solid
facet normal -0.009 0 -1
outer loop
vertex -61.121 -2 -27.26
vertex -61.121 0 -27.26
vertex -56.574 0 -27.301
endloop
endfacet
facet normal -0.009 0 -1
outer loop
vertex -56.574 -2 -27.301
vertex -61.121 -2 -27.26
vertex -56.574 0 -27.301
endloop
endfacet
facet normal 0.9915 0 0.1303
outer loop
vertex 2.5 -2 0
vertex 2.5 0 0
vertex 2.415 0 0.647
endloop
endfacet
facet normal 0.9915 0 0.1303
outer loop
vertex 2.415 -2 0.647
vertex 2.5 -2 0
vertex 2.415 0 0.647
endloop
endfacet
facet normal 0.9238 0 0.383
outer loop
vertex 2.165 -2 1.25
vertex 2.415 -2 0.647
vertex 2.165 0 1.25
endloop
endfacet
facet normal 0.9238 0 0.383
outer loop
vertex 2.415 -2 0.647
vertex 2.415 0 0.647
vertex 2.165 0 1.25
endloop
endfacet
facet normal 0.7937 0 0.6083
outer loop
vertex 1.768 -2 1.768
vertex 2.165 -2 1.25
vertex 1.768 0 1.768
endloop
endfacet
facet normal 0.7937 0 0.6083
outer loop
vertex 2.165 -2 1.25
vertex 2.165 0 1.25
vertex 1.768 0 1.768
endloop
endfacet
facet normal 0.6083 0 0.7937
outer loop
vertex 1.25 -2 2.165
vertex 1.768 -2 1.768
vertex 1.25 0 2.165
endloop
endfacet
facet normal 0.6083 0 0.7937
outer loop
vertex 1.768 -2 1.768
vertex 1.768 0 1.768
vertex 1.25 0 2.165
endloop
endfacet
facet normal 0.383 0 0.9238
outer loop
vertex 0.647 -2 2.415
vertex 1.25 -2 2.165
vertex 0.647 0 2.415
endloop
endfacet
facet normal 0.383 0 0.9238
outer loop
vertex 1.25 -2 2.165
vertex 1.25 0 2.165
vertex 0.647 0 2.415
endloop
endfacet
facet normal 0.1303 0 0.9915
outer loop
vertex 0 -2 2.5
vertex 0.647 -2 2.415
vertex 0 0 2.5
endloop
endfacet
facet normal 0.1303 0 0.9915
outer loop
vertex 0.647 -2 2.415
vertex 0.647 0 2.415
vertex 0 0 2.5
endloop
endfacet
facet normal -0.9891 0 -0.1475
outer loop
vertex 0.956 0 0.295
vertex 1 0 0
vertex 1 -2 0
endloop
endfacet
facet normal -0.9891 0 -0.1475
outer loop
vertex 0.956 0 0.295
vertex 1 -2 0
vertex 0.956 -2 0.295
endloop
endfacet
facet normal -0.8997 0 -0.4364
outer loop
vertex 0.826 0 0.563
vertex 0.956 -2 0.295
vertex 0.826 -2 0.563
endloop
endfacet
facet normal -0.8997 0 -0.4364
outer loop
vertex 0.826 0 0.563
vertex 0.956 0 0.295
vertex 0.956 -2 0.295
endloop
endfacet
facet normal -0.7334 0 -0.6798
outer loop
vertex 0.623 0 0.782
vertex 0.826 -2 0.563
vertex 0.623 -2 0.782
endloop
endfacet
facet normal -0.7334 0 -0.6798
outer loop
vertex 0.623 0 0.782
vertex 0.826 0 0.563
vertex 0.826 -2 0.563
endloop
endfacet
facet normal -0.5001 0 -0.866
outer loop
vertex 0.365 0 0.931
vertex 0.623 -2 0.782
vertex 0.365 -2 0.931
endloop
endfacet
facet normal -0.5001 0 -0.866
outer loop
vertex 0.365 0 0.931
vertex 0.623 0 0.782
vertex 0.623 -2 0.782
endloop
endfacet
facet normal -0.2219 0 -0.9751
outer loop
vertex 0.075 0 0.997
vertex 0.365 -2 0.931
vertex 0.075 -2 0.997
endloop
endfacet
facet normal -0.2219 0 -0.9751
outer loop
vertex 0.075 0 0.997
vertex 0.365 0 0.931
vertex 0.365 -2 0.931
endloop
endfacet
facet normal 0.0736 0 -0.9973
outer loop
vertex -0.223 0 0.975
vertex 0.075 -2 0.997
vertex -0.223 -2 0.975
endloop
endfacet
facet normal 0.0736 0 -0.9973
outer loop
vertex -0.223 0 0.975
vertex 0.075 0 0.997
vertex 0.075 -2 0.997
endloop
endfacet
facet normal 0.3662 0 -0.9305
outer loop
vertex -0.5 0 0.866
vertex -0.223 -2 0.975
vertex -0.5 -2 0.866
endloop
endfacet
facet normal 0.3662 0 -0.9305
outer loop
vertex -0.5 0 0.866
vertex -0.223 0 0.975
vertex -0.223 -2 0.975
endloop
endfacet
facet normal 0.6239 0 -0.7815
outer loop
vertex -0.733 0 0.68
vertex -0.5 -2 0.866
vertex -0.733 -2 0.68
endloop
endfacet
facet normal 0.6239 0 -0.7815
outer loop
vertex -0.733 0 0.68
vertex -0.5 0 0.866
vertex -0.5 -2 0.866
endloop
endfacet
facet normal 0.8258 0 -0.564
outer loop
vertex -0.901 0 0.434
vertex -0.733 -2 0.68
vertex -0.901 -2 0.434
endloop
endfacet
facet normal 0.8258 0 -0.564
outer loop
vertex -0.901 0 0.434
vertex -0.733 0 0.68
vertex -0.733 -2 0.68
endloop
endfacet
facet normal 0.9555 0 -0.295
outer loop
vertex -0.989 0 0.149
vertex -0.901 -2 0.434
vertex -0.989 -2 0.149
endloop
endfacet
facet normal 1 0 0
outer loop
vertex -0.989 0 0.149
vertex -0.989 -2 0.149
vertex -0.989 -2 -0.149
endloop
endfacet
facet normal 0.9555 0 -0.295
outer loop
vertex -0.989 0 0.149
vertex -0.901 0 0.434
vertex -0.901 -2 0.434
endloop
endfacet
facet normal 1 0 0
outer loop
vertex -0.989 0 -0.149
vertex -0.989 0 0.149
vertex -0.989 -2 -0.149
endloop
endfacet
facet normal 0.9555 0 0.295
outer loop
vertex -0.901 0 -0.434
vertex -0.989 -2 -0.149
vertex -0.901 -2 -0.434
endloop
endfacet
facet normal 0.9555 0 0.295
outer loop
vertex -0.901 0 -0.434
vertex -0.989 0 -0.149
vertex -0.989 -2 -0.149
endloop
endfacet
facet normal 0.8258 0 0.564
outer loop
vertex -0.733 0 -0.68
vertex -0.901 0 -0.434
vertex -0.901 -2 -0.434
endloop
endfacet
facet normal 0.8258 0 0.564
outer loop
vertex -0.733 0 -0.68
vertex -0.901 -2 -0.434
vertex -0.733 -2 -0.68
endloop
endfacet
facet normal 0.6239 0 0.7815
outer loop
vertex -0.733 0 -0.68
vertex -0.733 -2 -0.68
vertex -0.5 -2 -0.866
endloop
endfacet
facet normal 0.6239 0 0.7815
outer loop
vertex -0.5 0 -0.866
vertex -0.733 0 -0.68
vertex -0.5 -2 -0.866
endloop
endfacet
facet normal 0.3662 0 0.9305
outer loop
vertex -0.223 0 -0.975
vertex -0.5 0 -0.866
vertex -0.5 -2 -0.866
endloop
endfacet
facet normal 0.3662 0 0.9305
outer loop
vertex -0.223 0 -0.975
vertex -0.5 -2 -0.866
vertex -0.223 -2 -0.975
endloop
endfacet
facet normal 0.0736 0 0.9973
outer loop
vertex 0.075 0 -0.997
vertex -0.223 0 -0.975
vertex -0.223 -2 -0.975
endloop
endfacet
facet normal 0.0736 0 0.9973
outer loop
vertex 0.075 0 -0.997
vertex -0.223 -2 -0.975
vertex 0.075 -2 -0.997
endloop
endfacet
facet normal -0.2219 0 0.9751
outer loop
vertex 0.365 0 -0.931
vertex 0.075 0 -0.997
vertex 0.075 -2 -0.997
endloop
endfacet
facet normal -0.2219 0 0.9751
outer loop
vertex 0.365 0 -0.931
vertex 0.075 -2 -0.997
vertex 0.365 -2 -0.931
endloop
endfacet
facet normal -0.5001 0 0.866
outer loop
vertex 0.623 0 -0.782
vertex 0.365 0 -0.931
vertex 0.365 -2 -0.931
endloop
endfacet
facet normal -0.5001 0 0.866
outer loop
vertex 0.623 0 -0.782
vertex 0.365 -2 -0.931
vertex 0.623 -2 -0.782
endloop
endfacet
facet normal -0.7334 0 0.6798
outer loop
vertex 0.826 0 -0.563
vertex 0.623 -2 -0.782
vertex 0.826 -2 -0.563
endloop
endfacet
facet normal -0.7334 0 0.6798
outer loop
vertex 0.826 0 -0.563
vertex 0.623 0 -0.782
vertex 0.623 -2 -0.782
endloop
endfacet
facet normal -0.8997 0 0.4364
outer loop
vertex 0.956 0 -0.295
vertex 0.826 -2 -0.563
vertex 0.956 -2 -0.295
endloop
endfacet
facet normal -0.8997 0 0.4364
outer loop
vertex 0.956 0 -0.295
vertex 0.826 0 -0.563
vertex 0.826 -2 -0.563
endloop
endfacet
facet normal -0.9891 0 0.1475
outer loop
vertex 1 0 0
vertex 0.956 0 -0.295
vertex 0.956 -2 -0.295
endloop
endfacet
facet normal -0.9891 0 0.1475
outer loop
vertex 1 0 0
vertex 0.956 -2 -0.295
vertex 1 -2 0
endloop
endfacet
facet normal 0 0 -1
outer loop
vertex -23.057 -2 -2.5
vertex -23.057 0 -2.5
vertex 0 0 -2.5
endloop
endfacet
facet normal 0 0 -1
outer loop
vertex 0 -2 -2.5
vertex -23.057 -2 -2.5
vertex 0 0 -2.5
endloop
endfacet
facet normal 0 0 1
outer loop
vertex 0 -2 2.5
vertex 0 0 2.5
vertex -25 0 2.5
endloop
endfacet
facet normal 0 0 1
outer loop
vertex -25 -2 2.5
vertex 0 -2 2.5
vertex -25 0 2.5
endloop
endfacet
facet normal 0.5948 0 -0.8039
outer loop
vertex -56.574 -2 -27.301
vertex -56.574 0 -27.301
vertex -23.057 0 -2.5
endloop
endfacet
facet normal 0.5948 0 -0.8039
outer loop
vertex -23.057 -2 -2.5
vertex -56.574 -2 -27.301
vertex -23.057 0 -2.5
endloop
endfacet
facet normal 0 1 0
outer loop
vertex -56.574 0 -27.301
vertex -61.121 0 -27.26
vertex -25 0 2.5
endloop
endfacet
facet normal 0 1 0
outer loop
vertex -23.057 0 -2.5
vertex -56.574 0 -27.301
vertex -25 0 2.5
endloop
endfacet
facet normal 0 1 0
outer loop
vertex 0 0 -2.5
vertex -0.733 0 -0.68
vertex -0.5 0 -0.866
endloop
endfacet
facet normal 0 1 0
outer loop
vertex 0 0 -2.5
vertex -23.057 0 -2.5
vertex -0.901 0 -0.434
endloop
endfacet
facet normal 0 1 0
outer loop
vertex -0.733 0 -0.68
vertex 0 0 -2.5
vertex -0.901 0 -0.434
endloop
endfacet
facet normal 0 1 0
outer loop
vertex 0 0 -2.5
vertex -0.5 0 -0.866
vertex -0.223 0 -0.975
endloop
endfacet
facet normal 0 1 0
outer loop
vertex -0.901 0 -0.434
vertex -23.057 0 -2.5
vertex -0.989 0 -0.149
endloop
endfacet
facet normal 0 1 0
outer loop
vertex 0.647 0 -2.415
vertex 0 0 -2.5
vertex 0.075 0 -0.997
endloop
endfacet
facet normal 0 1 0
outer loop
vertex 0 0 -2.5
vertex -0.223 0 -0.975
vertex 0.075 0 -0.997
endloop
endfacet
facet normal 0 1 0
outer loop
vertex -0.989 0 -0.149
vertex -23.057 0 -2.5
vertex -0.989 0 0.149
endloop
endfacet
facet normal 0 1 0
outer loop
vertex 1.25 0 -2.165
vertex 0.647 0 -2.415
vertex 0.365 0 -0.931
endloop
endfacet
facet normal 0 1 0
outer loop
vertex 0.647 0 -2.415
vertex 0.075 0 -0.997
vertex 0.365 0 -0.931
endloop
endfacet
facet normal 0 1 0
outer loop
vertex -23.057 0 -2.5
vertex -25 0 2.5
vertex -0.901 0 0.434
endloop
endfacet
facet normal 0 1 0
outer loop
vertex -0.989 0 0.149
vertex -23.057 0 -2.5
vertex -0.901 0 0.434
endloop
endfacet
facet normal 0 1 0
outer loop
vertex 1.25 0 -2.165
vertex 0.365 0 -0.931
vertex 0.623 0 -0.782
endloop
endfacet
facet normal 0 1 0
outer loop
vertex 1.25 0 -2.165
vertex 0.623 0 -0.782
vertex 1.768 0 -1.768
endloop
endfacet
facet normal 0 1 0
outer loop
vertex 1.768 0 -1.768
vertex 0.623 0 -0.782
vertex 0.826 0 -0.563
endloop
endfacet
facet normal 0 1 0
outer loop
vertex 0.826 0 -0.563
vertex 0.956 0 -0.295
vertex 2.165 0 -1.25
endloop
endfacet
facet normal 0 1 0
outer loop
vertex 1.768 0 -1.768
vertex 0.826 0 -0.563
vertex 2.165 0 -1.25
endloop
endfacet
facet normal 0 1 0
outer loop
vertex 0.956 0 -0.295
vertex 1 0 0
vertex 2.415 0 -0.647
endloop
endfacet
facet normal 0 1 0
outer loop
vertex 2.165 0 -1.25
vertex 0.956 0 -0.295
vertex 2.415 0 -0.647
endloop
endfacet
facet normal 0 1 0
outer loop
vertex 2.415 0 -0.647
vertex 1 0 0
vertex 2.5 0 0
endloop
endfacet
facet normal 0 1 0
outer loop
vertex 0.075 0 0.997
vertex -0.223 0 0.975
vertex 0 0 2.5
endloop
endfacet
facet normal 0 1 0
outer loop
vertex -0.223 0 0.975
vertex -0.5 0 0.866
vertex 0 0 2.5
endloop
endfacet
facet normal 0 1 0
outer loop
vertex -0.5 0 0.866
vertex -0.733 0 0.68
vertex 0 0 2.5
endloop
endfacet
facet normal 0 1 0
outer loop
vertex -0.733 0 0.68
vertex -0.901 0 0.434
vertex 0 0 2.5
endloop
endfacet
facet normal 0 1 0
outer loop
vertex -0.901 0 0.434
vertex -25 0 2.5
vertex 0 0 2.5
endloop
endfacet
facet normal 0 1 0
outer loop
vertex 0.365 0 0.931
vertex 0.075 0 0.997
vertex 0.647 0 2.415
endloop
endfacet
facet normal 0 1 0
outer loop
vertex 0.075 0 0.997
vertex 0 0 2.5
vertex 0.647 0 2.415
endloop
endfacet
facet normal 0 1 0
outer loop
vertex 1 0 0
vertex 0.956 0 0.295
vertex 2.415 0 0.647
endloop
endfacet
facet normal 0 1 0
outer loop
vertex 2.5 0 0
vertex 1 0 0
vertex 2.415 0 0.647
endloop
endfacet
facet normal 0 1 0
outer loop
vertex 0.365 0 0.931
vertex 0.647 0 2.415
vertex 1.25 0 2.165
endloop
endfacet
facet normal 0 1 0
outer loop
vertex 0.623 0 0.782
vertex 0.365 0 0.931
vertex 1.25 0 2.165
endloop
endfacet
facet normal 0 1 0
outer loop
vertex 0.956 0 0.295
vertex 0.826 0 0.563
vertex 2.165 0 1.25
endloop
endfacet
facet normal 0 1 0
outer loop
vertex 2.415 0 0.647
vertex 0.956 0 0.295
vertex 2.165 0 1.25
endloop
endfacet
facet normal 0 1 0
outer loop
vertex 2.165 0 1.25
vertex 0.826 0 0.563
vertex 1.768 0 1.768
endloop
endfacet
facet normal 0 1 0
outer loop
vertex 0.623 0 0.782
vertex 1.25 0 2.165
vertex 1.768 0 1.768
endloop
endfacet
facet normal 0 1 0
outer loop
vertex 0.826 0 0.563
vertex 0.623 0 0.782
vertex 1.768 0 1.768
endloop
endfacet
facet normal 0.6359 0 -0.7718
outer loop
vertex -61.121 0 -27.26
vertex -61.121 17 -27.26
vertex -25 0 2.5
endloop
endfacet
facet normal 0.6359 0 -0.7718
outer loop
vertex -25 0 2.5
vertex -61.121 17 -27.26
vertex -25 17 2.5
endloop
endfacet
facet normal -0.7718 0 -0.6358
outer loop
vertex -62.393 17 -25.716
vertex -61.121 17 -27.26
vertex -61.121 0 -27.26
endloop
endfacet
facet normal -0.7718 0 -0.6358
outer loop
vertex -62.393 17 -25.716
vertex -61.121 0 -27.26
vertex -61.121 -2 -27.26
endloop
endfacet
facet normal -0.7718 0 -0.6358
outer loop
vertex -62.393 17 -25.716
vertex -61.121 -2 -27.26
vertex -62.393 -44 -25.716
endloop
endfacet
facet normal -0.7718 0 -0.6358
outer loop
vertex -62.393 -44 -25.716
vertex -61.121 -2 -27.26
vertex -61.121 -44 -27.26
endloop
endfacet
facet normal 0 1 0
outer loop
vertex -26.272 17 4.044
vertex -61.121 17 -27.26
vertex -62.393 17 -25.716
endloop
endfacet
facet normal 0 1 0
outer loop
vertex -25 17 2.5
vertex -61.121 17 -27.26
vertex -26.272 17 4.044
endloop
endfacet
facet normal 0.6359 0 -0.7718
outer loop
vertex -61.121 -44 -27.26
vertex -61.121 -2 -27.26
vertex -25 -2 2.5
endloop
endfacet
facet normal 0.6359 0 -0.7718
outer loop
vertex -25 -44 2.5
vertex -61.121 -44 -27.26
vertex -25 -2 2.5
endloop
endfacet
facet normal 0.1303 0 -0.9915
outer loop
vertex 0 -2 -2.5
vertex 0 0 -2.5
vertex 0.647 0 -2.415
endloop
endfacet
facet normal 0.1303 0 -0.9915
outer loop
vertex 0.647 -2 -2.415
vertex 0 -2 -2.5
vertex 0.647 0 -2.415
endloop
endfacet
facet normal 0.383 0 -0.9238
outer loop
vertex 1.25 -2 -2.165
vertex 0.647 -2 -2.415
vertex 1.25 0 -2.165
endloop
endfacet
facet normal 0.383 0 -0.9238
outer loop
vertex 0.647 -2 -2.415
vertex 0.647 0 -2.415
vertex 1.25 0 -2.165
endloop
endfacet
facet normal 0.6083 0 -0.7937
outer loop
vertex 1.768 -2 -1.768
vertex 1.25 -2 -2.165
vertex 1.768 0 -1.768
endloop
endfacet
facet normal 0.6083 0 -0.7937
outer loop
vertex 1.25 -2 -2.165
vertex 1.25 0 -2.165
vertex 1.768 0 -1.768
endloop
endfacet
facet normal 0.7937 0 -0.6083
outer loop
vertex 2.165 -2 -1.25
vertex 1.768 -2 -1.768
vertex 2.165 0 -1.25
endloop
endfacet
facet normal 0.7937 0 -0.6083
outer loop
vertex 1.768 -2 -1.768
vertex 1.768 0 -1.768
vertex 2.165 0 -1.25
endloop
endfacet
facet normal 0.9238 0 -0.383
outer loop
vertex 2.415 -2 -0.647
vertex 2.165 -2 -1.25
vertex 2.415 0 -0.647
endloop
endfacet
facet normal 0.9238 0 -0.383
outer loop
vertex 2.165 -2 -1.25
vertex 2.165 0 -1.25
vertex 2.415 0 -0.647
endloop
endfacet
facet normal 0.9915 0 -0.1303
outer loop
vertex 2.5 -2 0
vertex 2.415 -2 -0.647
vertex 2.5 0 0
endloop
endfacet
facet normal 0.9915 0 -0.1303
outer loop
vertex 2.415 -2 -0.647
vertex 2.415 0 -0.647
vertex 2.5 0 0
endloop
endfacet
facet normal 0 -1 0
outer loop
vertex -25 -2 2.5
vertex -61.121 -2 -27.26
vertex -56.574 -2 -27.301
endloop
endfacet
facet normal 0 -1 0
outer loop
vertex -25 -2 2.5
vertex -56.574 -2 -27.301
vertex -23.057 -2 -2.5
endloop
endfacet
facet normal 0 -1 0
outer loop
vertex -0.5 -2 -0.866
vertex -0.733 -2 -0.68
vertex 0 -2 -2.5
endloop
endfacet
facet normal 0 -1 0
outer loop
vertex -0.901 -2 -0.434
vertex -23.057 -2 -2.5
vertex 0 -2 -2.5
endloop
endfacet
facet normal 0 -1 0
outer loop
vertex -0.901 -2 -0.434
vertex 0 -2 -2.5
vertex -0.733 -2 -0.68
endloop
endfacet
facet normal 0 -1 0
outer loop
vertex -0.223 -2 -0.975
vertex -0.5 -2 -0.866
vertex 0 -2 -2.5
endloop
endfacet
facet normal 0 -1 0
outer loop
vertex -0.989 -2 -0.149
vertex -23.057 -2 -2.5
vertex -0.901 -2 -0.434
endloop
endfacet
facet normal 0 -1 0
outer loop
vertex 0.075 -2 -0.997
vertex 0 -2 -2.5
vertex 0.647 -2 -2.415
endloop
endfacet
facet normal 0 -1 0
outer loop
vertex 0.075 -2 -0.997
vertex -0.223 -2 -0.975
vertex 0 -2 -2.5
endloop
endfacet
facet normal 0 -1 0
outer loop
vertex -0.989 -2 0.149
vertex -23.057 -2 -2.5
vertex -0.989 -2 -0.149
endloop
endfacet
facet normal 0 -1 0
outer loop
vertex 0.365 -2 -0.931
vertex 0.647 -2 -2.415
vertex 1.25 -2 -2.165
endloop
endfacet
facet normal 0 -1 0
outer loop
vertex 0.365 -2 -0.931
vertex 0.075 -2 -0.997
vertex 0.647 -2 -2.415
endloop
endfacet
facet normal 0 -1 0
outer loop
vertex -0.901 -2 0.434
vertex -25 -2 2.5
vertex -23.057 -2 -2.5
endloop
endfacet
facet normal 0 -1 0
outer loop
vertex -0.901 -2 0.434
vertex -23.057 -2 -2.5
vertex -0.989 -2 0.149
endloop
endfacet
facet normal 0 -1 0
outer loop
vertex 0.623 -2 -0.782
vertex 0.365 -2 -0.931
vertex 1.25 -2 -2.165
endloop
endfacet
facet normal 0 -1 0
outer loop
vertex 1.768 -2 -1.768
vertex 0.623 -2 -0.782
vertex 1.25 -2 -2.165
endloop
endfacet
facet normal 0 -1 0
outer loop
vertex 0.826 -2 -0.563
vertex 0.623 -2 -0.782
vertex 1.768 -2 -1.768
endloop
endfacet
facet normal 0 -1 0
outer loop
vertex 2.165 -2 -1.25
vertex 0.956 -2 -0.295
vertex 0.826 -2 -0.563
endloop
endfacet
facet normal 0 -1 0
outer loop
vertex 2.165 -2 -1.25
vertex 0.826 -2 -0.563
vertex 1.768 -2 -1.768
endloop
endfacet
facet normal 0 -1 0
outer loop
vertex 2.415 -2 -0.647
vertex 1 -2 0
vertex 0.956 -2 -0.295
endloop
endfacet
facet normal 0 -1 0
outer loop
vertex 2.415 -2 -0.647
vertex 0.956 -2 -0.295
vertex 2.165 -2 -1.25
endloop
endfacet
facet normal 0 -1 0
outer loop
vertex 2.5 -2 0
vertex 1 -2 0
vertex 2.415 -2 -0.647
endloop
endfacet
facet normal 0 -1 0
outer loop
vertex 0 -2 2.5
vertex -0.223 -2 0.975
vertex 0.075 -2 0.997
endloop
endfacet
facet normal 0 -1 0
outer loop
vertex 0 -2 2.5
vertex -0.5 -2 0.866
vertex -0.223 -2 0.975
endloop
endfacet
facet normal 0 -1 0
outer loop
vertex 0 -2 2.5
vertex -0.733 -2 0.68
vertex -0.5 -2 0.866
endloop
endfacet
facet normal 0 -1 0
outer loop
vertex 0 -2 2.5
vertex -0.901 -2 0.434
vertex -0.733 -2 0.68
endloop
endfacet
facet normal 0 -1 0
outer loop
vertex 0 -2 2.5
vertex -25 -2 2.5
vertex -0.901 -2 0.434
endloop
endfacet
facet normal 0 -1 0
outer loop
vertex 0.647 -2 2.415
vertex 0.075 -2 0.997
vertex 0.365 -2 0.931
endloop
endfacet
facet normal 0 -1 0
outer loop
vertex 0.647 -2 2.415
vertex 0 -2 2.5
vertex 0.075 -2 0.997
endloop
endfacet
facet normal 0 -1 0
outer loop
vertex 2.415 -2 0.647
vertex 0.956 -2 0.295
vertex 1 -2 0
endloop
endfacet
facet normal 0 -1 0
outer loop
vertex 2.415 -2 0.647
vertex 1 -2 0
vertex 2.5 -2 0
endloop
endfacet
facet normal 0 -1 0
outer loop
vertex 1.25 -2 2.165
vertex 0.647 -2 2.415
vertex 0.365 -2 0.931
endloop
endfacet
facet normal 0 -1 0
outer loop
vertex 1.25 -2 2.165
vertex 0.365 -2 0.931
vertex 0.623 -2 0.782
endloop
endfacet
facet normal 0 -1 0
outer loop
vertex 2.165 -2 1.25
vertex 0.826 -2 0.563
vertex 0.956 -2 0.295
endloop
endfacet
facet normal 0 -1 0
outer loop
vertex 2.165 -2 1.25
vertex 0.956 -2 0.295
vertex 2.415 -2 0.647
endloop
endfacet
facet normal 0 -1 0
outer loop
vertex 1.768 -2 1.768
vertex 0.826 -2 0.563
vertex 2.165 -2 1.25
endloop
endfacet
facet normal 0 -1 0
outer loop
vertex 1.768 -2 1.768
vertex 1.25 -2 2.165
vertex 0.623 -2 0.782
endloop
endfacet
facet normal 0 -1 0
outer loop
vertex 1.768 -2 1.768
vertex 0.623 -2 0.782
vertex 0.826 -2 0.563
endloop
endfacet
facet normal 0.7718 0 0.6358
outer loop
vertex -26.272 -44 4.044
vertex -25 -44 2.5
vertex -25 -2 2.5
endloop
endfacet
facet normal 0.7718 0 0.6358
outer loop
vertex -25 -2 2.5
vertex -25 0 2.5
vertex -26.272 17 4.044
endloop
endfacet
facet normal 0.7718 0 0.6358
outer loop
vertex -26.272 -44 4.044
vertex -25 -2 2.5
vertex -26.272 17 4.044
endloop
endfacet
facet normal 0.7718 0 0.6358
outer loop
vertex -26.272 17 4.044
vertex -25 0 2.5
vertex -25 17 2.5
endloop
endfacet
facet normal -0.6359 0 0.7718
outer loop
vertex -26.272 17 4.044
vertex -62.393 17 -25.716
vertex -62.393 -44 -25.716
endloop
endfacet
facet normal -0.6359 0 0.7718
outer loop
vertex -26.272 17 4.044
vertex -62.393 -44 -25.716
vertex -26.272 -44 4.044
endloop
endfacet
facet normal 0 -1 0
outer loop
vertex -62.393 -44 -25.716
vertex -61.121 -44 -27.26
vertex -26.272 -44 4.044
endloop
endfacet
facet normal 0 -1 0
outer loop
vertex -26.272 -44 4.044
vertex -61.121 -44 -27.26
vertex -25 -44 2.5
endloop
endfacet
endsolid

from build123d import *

# Parameters (mm, degrees)
F0_R     = 1
F1_DEPTH = 2
F2_W     = 46.8014790542
F2_H     = 17
F2_H_2   = 2
F2_H_3   = 42
F3_DEPTH = 2


with BuildPart() as f1:
    # F0 (on Front) → F1 (new body)
    with BuildSketch(Plane.XZ):
        with BuildLine():
            ThreePointArc((0, -2.5), (-2.5, 0), (0, 2.5))
            Line((0, 2.5), (-25, 2.5))
            Line((-25, 2.5), (-61.1211777337, -27.2596868397))
            Line((-61.1211777337, -27.2596868397), (-56.5739951013, -27.3005926817))
            Line((-56.5739951013, -27.3005926817), (-23.0573490262, -2.5))
            Line((-23.0573490262, -2.5), (0, -2.5))
        make_face()
        with BuildLine():
            ThreePointArc((0, -2.5), (1.767766953, -1.767766953), (2.5, 0))
            ThreePointArc((2.5, 0), (1.767766953, 1.767766953), (0, 2.5))
            ThreePointArc((0, 2.5), (-2.5, 0), (0, -2.5))
        make_face()
        Circle(F0_R, mode=Mode.SUBTRACT)
    extrude(amount=F1_DEPTH)

    # F2 (on face) → F3 (join)
    with BuildSketch(Plane(origin=(-11.3351925365, 0, 13.7582262361), x_dir=(0.7717956454, 0, 0.6358706486), z_dir=(-0.6358706486, 0, 0.7717956454))):
        with Locations((-41.1059540414, 8.5)):
            Rectangle(F2_W, F2_H)
        with Locations((-41.1059540414, -1)):
            Rectangle(F2_W, F2_H_2)
        with Locations((-41.1059540414, -23)):
            Rectangle(F2_W, F2_H_3)
    extrude(amount=F3_DEPTH)


solid = f1.part
